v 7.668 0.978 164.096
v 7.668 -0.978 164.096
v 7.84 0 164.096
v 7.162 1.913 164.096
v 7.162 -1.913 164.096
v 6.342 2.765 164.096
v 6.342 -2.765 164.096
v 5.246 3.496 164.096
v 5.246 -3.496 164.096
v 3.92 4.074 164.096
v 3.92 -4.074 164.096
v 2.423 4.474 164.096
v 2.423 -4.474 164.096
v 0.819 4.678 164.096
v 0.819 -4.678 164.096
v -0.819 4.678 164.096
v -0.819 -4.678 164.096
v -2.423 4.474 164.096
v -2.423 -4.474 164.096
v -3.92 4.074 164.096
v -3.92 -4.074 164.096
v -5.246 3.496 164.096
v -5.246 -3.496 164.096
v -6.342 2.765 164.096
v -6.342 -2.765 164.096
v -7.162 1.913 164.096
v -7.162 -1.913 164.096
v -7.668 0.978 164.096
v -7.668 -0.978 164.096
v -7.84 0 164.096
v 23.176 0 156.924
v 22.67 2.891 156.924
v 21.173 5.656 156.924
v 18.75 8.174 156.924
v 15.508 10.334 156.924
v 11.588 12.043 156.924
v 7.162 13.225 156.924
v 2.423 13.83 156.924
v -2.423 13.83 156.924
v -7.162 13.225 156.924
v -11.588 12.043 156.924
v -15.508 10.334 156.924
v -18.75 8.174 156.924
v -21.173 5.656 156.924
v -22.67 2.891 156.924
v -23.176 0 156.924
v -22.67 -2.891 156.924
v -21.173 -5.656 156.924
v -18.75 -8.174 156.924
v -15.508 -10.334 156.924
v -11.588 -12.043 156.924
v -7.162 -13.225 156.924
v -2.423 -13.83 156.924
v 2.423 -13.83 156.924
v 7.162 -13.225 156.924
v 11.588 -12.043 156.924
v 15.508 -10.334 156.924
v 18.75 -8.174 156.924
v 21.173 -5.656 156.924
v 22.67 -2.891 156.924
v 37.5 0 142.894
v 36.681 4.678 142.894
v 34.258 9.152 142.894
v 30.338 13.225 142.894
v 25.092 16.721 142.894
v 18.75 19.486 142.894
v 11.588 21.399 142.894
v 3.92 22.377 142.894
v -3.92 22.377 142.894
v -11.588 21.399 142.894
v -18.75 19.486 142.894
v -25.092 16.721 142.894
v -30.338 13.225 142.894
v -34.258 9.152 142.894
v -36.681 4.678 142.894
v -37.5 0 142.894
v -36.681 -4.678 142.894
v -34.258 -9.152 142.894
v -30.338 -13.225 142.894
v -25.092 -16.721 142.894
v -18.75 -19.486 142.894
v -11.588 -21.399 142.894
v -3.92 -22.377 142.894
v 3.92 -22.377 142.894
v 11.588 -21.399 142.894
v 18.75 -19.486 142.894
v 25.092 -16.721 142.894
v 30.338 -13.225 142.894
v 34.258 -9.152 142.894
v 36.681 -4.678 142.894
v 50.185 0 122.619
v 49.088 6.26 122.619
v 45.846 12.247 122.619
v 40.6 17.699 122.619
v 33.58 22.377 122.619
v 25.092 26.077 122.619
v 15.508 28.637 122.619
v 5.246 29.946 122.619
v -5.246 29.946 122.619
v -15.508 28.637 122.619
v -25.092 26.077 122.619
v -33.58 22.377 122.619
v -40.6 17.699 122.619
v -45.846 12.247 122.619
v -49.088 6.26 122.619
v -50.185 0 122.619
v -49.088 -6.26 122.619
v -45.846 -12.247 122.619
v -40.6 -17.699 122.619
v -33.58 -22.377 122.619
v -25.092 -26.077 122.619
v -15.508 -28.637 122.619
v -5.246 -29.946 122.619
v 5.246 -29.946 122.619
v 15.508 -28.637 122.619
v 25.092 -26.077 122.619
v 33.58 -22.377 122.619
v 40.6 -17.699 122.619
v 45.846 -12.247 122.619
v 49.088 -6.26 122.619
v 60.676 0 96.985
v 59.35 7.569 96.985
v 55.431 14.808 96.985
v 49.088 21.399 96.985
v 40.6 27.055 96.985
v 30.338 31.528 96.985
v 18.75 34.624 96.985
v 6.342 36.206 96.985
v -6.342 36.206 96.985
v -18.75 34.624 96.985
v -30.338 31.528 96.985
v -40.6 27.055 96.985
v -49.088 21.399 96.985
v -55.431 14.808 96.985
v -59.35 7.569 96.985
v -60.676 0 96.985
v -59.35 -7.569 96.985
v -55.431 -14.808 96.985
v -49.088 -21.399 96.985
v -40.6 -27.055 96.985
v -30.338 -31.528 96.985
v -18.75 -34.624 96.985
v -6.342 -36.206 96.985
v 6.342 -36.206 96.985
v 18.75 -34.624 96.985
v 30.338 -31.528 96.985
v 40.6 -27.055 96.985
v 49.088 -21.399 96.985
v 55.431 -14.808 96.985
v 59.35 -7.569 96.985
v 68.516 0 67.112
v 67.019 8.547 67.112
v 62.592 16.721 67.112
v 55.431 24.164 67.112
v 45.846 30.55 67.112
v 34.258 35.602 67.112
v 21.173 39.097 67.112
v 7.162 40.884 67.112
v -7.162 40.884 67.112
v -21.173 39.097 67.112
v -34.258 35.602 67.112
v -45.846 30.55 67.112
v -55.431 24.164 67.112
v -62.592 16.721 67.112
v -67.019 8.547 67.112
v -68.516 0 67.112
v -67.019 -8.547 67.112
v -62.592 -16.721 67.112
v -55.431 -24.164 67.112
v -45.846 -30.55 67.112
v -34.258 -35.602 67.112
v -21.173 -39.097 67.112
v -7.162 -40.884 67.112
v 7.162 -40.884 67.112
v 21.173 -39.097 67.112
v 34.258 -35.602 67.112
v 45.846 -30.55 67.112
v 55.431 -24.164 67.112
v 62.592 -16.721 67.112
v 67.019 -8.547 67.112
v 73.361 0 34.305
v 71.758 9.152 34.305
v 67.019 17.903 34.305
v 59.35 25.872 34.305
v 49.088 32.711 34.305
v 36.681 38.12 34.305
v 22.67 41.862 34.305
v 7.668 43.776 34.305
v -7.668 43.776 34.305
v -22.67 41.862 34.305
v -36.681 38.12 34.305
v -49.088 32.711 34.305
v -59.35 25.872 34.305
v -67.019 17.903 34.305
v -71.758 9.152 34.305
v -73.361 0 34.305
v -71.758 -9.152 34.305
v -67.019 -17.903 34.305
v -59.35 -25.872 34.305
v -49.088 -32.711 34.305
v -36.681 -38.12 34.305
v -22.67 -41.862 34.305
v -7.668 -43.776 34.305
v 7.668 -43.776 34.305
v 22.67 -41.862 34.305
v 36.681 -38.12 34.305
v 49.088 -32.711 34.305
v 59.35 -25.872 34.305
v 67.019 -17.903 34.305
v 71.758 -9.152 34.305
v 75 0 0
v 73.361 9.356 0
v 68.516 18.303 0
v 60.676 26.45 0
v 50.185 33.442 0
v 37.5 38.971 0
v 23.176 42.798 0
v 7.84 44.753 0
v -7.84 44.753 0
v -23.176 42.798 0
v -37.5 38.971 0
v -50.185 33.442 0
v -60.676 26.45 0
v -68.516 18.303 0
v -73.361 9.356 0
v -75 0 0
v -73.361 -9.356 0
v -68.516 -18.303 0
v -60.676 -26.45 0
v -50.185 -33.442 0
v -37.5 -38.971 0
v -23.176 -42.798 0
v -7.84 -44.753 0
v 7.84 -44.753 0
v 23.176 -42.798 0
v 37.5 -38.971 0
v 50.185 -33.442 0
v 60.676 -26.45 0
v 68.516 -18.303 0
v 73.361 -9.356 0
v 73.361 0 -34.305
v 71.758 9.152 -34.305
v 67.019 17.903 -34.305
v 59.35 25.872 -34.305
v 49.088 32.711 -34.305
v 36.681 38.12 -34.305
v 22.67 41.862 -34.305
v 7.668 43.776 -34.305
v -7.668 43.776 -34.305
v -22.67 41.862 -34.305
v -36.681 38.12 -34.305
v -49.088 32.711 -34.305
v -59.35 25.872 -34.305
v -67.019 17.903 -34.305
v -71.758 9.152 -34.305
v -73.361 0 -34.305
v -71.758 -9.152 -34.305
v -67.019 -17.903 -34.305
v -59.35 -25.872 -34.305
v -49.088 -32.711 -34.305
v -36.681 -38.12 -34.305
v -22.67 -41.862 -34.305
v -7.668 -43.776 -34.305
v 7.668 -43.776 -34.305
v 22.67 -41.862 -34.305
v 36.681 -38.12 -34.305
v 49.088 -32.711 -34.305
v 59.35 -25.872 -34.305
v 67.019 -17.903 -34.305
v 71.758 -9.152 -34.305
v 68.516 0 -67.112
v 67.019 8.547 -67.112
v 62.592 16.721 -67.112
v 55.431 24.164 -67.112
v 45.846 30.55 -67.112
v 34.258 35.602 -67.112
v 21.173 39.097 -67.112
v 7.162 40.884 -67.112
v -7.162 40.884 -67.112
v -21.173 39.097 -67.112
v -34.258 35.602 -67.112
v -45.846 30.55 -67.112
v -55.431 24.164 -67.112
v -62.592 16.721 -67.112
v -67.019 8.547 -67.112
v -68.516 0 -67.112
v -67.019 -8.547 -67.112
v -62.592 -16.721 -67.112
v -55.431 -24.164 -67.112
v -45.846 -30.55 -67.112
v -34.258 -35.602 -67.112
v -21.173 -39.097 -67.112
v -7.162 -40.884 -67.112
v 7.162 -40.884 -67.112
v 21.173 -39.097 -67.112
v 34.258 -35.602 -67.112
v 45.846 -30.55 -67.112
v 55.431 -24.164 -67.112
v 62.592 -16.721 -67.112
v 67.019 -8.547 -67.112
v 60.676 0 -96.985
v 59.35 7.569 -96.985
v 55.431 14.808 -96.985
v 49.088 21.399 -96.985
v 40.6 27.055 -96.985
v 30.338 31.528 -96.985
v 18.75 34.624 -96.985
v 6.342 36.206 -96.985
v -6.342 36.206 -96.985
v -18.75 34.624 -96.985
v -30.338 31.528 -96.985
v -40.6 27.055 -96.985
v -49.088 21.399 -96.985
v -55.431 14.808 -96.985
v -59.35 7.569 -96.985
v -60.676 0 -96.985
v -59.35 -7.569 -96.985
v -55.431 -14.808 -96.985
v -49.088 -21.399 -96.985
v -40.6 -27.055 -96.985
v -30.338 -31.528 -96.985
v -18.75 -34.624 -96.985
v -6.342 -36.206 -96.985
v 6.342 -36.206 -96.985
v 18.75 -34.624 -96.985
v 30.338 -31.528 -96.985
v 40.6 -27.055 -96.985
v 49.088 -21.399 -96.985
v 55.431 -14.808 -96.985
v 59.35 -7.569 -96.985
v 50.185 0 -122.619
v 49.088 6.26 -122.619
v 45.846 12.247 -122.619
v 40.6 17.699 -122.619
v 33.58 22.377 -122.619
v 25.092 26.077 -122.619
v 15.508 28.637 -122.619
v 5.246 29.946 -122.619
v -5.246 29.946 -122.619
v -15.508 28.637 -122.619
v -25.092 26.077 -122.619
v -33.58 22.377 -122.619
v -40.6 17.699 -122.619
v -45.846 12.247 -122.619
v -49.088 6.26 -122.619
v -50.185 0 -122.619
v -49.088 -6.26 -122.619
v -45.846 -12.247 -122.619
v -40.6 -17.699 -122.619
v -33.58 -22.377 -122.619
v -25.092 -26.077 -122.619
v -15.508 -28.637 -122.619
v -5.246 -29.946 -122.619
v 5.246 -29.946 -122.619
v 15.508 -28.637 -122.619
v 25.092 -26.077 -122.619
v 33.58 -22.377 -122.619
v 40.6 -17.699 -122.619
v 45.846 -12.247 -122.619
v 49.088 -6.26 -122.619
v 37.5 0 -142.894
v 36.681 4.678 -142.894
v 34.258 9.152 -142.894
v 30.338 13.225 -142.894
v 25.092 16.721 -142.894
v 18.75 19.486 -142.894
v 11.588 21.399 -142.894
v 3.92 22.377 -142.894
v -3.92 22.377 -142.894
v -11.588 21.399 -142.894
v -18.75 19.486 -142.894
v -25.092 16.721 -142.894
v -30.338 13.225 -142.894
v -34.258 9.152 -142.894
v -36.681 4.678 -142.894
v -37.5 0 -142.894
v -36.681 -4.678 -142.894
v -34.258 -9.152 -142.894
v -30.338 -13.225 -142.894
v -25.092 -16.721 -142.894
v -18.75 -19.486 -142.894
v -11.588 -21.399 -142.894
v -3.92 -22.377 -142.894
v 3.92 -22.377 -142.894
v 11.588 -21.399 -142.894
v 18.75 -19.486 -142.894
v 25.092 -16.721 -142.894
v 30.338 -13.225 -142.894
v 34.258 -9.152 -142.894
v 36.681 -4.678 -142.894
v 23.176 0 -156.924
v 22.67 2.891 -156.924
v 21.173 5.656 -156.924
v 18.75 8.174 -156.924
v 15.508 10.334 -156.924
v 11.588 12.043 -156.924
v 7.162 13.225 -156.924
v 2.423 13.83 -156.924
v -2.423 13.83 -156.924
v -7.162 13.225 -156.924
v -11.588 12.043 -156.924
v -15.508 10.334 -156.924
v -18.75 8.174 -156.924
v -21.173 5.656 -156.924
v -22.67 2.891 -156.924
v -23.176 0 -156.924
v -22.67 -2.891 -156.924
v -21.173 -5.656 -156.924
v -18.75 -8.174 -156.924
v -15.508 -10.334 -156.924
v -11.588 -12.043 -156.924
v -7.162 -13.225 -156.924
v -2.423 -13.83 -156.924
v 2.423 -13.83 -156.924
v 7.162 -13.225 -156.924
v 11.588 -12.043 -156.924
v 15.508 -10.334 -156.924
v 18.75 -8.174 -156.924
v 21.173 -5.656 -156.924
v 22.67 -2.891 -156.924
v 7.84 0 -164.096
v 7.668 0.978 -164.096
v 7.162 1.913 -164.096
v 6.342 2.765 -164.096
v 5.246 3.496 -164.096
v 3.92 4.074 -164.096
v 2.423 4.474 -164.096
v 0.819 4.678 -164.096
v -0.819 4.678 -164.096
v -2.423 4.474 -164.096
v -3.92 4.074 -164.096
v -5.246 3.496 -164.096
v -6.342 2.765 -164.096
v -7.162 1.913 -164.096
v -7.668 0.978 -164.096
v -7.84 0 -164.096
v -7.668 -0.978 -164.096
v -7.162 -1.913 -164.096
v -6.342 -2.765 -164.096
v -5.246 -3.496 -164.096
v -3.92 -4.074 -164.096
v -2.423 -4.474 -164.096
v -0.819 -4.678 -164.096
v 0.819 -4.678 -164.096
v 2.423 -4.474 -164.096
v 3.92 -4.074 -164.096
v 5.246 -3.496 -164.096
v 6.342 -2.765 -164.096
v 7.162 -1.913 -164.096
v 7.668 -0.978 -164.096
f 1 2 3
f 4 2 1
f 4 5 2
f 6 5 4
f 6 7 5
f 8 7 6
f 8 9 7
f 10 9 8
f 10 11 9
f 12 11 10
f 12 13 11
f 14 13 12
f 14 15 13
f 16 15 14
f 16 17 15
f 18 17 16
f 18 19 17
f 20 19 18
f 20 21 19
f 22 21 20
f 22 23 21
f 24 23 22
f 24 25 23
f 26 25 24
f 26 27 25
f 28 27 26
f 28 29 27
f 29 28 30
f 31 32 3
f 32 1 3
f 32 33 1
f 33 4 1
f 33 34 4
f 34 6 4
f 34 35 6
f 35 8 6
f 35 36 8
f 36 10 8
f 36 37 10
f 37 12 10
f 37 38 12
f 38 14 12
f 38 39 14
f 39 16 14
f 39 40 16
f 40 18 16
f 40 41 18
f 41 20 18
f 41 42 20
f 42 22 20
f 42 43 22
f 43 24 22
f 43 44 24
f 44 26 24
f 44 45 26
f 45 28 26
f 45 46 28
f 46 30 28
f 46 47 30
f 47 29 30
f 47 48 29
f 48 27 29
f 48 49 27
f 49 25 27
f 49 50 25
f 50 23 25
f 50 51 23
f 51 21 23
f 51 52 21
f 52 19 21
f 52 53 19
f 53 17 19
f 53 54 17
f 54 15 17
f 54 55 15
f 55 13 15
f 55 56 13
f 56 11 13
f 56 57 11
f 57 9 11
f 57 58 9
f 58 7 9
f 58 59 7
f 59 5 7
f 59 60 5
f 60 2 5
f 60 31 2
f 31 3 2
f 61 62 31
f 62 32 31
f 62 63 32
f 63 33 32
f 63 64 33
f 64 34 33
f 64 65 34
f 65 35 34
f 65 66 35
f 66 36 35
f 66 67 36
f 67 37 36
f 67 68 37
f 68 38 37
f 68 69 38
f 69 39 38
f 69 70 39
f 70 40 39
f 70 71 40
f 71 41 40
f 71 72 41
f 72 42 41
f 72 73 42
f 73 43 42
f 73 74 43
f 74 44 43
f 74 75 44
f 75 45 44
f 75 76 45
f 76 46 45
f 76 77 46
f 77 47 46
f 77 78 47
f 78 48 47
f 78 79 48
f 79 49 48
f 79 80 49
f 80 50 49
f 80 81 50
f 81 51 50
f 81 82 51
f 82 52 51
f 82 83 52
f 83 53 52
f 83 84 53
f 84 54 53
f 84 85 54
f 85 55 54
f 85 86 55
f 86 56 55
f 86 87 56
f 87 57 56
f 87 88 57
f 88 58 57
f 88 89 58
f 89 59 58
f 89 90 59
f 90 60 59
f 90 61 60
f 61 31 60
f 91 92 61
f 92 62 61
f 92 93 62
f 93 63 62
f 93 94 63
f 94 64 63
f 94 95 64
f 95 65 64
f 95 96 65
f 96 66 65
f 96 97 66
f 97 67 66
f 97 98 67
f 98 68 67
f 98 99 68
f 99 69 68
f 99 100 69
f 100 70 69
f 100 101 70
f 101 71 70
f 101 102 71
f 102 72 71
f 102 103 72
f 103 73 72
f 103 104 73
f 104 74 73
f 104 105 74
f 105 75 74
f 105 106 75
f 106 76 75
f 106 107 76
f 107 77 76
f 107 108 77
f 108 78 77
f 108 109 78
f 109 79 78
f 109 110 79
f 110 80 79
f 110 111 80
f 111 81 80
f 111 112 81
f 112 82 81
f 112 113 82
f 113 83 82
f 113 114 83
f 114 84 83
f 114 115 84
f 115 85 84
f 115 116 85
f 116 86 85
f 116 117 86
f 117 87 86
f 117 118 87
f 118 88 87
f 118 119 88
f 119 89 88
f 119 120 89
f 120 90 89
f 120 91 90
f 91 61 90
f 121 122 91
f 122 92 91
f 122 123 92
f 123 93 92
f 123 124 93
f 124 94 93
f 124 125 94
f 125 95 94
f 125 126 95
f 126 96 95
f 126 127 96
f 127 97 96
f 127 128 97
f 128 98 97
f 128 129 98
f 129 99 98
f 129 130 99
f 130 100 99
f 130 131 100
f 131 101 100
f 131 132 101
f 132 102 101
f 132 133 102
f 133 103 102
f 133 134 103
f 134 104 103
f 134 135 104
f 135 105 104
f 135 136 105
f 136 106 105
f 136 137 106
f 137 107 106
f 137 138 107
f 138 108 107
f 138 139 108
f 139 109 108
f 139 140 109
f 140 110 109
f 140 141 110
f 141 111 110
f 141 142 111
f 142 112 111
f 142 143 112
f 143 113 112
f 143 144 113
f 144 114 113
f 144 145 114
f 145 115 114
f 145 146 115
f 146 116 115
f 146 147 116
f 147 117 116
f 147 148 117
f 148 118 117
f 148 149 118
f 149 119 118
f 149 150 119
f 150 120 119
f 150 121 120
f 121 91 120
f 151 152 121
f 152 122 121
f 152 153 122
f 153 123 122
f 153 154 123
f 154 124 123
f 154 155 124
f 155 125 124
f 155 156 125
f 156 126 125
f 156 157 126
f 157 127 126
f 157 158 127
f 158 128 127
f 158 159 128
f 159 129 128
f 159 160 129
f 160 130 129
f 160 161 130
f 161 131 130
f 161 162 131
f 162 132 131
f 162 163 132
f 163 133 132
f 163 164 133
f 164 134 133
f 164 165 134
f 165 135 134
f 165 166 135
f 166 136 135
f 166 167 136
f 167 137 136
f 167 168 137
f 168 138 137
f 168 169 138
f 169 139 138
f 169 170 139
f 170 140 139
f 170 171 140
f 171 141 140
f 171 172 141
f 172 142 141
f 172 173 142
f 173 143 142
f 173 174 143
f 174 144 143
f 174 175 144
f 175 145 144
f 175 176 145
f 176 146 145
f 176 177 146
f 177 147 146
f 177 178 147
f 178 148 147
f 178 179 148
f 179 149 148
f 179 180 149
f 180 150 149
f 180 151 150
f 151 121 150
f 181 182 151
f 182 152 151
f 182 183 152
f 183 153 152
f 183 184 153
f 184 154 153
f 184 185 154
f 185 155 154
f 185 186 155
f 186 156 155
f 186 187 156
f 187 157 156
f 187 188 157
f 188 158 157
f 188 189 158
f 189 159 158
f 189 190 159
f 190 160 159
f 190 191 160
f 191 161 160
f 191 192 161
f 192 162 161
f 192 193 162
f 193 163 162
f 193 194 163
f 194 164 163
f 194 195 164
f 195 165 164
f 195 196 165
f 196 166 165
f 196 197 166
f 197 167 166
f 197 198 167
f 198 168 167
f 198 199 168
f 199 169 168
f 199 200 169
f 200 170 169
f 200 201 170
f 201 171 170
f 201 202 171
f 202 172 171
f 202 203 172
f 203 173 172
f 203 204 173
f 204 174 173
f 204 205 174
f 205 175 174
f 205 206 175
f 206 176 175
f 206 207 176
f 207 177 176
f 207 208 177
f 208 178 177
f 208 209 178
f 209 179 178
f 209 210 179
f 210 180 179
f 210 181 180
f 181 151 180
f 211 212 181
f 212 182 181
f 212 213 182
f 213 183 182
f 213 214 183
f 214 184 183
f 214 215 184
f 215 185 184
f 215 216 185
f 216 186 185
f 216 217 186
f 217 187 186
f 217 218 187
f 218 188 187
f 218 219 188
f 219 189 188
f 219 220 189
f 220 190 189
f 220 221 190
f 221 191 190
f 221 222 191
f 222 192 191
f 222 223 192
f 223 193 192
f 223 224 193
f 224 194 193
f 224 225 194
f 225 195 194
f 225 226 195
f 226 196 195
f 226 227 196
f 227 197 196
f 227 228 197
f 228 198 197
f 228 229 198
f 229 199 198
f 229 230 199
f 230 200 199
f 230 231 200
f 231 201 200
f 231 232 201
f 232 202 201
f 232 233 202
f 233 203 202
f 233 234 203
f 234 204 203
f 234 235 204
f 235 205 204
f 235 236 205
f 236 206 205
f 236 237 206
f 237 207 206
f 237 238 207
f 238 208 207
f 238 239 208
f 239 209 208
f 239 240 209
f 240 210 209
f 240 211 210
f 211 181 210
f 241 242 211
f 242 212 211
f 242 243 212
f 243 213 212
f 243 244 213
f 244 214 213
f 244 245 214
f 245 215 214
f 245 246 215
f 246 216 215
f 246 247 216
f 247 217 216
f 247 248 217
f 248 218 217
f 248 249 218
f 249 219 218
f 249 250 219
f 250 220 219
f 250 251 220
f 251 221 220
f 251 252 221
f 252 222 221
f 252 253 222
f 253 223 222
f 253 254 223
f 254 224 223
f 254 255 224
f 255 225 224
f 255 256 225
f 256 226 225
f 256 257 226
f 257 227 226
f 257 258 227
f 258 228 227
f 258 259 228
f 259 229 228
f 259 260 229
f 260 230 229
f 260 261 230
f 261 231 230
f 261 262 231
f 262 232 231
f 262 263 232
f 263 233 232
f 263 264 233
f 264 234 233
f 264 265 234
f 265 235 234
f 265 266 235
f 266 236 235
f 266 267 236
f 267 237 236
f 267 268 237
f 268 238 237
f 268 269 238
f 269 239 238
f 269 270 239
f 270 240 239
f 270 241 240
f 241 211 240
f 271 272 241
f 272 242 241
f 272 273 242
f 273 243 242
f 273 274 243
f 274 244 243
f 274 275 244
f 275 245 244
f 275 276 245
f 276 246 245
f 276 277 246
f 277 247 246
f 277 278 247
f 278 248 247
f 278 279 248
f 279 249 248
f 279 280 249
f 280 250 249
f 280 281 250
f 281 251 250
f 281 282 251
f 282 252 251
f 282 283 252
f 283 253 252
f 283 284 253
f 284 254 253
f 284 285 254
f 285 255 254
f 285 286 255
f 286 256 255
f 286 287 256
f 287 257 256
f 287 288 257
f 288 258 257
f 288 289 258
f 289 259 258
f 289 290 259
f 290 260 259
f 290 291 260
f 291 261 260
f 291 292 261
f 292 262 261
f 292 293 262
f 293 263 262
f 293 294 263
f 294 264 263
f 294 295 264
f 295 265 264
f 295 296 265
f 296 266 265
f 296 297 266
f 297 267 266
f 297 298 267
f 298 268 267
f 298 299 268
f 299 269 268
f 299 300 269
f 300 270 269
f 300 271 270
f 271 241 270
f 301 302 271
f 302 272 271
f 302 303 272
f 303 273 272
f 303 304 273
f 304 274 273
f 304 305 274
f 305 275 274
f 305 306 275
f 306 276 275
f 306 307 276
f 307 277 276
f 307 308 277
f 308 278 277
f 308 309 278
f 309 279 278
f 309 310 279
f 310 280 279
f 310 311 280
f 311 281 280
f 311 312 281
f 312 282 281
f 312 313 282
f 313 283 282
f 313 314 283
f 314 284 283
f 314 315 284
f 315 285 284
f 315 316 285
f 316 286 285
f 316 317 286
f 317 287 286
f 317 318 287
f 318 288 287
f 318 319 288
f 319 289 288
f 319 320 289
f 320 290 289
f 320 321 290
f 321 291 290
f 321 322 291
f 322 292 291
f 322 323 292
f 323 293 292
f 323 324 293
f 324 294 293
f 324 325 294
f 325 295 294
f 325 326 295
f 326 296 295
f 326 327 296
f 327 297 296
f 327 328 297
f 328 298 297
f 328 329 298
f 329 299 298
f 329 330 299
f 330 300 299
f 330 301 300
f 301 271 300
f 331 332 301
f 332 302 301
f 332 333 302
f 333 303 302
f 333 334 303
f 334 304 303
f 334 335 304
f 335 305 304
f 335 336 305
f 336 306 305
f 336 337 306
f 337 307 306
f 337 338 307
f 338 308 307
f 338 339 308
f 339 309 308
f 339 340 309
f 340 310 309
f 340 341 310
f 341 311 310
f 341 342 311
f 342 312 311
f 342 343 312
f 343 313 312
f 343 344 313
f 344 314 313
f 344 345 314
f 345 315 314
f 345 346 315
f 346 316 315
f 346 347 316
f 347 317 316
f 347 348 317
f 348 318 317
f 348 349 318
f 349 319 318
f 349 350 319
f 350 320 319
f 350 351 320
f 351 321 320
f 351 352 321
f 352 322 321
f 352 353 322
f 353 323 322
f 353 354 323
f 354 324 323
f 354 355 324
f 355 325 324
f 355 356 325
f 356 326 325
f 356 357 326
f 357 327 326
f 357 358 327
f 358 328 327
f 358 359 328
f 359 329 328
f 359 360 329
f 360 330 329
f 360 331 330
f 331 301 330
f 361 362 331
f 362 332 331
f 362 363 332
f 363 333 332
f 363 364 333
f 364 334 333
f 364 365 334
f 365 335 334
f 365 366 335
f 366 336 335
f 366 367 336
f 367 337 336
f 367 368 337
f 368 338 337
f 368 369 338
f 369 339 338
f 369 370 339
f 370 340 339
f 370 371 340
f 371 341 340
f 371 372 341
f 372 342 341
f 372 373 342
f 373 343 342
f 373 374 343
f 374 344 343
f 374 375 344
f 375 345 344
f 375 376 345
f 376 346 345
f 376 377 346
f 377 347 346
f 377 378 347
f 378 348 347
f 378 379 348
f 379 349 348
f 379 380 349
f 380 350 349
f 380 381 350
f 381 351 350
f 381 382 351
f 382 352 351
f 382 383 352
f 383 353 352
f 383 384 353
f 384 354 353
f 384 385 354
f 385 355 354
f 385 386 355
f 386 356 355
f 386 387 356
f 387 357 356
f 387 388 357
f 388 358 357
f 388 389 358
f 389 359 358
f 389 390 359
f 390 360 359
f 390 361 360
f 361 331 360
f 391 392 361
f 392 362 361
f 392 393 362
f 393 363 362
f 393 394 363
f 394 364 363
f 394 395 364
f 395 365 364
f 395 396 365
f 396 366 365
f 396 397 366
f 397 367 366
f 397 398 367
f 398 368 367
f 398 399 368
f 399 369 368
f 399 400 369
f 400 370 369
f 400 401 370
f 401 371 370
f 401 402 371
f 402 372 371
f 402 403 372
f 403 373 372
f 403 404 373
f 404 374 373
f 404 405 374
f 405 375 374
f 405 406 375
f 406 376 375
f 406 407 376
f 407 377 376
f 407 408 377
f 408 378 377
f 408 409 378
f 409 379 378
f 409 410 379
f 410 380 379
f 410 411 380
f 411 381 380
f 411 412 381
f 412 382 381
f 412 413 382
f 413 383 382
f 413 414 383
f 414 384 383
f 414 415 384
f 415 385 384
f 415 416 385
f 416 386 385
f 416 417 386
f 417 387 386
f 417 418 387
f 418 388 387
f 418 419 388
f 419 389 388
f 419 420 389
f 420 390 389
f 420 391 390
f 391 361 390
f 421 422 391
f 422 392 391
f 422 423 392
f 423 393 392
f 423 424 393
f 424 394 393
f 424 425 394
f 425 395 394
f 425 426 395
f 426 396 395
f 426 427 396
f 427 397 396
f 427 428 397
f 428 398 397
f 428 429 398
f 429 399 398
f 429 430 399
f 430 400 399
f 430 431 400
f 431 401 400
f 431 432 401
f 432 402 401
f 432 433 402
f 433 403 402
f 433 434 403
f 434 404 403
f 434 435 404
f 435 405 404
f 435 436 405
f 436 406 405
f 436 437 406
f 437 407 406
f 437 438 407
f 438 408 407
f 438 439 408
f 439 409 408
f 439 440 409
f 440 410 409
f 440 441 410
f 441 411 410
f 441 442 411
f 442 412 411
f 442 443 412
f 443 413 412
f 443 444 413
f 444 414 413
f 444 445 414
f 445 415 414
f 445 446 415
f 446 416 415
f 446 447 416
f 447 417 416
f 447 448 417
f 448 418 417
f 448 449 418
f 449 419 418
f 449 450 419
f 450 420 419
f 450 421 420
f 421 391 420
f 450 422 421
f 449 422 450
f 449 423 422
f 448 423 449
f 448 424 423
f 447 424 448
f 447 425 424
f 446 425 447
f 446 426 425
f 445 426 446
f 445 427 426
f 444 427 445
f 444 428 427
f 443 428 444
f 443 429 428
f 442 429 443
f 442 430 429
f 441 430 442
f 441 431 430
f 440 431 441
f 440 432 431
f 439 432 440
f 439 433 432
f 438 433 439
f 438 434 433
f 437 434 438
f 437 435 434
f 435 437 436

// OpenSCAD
// Generated by SolidPython 1.0.1 on 2020-07-29 00:46:46


scale(v = [5, 3, 11]) {
	sphere(r = 15);
}
/***********************************************
*********      SolidPython code:      **********
************************************************
 
# import packages: SolidPython
from solid import *
from solid.utils import *
from itertools import chain, combinations, permutations


class Resize:

    def __init__(self, scad_file):
        self.scad_file = scad_file
        #self.scad_file = import_scad(scad_file)
        # cone/cylinder param:
        self.r1 = 0
        self.r2 = 0
        self.h = 0
        # rectangular prism param:
        self.w = 0
        self.l = 0
        # ellipse param:
        self.r = 0

    # import OpenScad code (file name corresponds to shape)


    # classify shape + parameters
    def assign(self, param1, param2, param3):
        if self.scad_file == 'cone.scad':
            self.r1 = param1
            self.r2 = param2
            self.h = param3
        elif self.scad_file == 'cylinder.scad':
            self.r1 = param1
            self.r2 = param2
            self.h = param3
        elif self.scad_file == 'rectangularPrism.scad':
            self.h = param1
            self.l = param2
            self.w = param3
        else:
            self.r = param1
            self.h = param2

    # resize parameters
    def iterate(self):
        x = range(3, 20, 2)
        i = 1
        if self.scad_file == 'cone.scad':
            tempList = list(permutations(x, 2))
            for temp in tempList:
                param1 = temp[0]
                param2 = temp[1]
                filepath = 'produced_scad_files/' + 'cone' + str(param1) + '_' + str(param2) + '_' + '.scad'
                scad_render_to_file(cylinder(h=param1, r1=param2, r2=0), filepath)

        elif self.scad_file == 'cylinder.scad':
            tempList = list(permutations(x, 3))
            for temp in tempList:
                param1 = temp[0]
                param2 = temp[1]
                filepath = 'produced_scad_files/' + 'cylinder' + str(param1) + '_' + str(param2) + '_' + '.scad'
                scad_render_to_file(cylinder(h=param1, r1=param2, r2=param2), filepath)

        elif self.scad_file == 'rectangularPrism.scad':
            tempList = list(permutations(x, 3))
            for temp in tempList:
                param1 = temp[0]
                param2 = temp[1]
                param3 = temp[2]
                filepath = 'produced_scad_files/' + 'rectangularPrism' + str(param1) + '_' + str(param2) + '_' + str(
                    param3) + '.scad'
                scad_render_to_file(cube(size=(param1, param2, param3)), filepath)

        elif self.scad_file == 'ellipse.scad':
            tempList = list(permutations(x, 4))
            for temp in tempList:
                param1 = temp[0]
                param2 = temp[1]
                param3 = temp[2]
                param4 = temp[3]
                filepath = 'produced_scad_files/' + 'ellipse' + str(param1) + '_' + str(param2) + '_' + str(param3) + '_' + str(param4) + '.scad'
                scad_render_to_file(scale([param1, param2, param3])(sphere(r=param4)), filepath)

    def render_to_scadfile(self):
        scad_render_to_file(scad, 'example.scad') 
 
************************************************/
